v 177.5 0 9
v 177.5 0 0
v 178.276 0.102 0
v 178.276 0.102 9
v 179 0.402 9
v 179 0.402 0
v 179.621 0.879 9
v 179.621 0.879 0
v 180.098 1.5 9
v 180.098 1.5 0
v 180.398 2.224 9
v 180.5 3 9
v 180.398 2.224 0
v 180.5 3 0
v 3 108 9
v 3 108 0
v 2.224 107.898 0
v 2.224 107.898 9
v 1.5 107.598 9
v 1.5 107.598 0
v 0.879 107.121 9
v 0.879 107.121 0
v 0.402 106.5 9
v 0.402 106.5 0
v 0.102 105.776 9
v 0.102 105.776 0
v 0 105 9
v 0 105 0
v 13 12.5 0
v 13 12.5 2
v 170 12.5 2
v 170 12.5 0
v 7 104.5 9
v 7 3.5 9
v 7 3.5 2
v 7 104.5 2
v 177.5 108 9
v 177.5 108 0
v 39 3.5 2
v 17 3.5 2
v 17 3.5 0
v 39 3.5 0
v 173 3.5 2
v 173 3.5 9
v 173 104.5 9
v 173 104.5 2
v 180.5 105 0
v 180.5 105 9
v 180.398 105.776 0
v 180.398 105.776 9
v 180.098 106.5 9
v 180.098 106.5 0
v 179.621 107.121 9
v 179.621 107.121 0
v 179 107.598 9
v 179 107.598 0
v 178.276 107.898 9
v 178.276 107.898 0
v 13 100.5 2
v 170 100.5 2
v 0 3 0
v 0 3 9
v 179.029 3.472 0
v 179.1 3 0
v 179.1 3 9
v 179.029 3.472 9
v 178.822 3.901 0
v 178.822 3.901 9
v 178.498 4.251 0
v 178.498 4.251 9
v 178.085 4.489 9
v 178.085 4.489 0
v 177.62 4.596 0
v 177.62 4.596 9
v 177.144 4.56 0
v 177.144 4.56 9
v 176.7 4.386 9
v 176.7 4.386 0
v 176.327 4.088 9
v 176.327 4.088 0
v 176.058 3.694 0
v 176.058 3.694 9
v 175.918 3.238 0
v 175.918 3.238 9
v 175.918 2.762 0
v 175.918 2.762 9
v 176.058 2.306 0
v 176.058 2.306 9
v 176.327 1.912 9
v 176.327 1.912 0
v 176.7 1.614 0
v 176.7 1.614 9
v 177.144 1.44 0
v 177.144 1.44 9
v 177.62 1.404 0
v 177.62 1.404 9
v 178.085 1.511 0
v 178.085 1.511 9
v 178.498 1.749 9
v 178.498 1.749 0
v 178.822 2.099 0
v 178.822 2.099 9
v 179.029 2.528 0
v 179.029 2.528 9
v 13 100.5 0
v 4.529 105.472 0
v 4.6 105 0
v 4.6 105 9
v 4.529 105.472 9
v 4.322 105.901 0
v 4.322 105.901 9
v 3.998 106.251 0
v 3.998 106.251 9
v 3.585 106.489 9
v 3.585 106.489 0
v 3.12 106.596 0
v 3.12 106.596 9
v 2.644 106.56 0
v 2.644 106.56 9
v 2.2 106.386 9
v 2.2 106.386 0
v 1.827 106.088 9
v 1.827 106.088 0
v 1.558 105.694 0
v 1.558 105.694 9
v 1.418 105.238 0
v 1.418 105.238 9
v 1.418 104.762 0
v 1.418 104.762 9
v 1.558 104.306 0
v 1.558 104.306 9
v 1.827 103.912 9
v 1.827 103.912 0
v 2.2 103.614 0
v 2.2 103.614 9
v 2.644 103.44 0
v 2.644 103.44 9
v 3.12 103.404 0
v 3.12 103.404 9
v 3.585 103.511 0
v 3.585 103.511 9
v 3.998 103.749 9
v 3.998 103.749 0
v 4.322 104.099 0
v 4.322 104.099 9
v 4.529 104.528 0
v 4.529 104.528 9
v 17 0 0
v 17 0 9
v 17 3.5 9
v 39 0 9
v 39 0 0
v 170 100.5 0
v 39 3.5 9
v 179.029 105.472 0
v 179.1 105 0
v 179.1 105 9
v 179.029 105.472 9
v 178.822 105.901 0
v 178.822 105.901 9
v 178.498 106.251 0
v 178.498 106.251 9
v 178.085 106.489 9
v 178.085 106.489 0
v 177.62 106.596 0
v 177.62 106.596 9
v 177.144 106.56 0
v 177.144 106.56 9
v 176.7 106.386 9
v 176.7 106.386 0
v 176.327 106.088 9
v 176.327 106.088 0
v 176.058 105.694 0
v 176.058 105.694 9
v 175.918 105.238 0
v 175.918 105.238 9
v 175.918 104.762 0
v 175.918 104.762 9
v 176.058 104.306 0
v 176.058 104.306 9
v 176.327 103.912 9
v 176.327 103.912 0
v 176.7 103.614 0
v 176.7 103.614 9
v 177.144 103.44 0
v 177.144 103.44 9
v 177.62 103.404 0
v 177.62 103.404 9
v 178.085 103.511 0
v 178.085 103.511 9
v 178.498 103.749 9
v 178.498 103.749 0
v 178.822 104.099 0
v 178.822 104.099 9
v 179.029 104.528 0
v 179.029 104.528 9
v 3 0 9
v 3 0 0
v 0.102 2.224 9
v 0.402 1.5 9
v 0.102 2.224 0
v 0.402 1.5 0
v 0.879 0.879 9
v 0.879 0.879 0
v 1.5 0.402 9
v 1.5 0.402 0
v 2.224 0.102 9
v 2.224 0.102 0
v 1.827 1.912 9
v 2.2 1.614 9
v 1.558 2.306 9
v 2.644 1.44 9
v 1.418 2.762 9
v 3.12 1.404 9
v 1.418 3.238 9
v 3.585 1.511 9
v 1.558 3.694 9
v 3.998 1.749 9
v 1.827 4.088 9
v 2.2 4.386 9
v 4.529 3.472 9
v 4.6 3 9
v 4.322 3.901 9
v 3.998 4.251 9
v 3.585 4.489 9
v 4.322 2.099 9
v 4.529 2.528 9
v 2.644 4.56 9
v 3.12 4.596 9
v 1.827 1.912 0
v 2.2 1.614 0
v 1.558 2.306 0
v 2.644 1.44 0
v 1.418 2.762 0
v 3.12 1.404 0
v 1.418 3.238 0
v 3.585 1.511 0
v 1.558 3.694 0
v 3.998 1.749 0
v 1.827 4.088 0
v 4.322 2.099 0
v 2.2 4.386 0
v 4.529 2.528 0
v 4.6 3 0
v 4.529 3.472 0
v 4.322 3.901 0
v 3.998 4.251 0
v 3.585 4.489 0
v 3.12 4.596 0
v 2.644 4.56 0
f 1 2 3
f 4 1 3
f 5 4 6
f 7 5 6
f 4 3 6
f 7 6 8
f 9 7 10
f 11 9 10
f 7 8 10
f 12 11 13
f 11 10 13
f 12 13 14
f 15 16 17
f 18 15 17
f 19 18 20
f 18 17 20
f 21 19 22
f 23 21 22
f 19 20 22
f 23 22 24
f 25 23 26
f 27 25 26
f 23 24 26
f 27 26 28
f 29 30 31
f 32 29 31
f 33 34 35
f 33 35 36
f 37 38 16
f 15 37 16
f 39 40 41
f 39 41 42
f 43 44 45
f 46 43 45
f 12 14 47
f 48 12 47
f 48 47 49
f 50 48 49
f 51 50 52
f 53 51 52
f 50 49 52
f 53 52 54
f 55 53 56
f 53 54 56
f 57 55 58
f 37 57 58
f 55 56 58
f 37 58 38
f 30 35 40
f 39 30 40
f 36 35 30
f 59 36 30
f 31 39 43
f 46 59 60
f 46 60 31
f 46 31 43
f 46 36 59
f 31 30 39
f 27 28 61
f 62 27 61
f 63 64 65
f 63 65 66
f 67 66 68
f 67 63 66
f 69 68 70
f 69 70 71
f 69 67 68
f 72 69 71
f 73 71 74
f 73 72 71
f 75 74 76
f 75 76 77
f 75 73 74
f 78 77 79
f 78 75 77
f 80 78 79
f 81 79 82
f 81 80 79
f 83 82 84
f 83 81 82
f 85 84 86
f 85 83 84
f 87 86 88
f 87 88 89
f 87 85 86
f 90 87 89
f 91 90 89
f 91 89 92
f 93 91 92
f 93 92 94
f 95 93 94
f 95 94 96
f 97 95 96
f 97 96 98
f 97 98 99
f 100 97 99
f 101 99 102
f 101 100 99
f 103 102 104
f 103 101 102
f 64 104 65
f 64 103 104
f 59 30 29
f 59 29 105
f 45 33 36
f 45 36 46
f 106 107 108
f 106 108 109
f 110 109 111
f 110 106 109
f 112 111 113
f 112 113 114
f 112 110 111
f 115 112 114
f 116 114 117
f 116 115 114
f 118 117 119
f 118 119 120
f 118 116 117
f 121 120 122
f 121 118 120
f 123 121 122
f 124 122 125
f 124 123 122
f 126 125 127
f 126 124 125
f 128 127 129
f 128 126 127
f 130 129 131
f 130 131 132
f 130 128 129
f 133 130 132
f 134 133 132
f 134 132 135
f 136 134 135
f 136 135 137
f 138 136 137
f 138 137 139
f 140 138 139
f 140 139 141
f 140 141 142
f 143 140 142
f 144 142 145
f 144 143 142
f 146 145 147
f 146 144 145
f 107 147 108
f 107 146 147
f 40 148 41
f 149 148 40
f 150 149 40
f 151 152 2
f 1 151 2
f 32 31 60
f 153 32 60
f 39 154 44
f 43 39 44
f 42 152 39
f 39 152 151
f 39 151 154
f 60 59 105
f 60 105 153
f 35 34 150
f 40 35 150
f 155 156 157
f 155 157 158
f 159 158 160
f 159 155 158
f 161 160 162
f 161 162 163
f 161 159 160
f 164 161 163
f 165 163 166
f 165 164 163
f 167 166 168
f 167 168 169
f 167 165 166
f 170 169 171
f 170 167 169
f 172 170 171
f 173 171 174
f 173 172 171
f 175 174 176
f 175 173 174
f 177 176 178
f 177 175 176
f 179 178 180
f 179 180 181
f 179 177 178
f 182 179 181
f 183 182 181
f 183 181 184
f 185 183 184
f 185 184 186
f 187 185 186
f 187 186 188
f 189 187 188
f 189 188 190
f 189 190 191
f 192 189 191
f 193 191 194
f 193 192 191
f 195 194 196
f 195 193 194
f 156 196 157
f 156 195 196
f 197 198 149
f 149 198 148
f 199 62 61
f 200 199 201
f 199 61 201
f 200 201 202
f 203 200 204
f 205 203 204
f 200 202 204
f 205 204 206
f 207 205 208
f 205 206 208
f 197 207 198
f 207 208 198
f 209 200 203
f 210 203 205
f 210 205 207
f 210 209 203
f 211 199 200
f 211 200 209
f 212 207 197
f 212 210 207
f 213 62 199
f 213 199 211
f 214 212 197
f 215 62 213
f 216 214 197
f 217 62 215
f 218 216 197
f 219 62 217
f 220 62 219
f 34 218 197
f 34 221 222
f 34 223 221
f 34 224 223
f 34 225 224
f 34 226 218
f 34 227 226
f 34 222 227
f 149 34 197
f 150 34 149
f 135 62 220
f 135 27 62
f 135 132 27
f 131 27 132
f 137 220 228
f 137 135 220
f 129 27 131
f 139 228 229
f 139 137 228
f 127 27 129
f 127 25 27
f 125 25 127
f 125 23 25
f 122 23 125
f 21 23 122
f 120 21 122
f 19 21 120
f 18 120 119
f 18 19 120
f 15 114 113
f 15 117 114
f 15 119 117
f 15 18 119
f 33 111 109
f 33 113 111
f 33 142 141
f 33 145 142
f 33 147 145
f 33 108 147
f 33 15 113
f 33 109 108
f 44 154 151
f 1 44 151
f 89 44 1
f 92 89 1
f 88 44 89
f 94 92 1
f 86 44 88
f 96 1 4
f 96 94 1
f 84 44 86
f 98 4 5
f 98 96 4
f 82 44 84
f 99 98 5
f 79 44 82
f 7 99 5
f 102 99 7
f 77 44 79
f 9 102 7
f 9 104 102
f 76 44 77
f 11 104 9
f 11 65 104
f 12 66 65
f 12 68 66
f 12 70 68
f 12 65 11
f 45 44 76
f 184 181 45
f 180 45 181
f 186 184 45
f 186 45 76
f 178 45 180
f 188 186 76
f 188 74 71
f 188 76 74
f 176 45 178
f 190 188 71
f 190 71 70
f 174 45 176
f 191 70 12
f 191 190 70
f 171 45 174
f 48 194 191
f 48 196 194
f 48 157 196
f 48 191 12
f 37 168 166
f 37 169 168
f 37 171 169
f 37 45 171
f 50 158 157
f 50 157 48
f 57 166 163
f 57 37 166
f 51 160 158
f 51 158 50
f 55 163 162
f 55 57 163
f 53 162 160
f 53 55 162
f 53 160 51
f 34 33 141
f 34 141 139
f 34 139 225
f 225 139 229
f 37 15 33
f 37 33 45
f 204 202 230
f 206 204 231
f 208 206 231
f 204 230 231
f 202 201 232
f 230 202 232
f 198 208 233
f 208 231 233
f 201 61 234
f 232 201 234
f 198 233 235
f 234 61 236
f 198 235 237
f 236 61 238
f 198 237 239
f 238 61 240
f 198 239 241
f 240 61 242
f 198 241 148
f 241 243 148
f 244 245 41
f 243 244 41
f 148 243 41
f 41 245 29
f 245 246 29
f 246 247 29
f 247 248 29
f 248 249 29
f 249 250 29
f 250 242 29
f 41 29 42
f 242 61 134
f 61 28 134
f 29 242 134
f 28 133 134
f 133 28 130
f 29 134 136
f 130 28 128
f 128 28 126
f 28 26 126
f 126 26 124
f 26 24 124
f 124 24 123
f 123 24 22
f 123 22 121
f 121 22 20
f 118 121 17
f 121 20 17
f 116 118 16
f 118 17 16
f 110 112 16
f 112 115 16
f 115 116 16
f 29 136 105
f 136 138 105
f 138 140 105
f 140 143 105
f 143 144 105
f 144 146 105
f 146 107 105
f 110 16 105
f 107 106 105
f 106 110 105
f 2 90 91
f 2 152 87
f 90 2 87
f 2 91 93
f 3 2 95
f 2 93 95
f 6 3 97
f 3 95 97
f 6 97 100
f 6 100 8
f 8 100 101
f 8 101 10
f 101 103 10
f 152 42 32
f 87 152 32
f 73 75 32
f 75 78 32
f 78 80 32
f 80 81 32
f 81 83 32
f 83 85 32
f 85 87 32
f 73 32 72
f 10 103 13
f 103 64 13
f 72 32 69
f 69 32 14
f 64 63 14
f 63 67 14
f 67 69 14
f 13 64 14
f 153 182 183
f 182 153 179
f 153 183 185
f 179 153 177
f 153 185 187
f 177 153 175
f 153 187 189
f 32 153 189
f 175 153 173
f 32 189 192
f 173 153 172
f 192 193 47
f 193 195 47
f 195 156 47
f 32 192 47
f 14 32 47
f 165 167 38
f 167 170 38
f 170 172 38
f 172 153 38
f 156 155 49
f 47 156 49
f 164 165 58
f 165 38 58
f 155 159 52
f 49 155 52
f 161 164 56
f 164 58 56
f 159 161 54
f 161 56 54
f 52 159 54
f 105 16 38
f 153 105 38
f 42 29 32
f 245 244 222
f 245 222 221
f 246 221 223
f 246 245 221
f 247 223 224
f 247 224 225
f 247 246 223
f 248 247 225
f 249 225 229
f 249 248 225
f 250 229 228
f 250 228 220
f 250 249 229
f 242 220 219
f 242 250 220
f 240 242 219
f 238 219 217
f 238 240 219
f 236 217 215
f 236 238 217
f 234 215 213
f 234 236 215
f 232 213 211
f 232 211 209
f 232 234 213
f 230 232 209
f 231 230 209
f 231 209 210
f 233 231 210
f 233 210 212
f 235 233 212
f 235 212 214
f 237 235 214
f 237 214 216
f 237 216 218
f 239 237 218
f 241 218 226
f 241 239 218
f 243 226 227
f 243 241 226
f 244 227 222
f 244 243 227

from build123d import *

# Parameters (mm, degrees)
SKETCH_1_R          = 1.6
EXTRUDE_3_DEPTH     = 9
SKETCH_3_W          = 166
SKETCH_3_H          = 101
CUT_EXTRUDE_1_DEPTH = 7
SKETCH_5_W          = 157
SKETCH_5_H          = 88
CUT_EXTRUDE_2_DEPTH = 211.459616079
SKETCH_6_W          = 22
SKETCH_6_H          = 3.5
CUT_EXTRUDE_3_DEPTH = 211.535626439


with BuildPart() as part:
    # 草图1 → 凸台-拉伸3 (new body)
    with BuildSketch(Plane.XY):
        with BuildLine():
            Line((3, 0), (177.5, 0))
            ThreePointArc((177.5, 0), (179.621320344, 0.878679656), (180.5, 3))
            Line((180.5, 3), (180.5, 105))
            ThreePointArc((180.5, 105), (179.621320344, 107.121320344), (177.5, 108))
            Line((177.5, 108), (3, 108))
            ThreePointArc((3, 108), (0.878679656, 107.121320344), (0, 105))
            Line((0, 105), (0, 3))
            ThreePointArc((0, 3), (0.878679656, 0.878679656), (3, 0))
        make_face()
        with Locations((3, 3)):
            Circle(SKETCH_1_R, mode=Mode.SUBTRACT)
        with Locations((3, 105)):
            Circle(SKETCH_1_R, mode=Mode.SUBTRACT)
        with Locations((177.5, 105)):
            Circle(SKETCH_1_R, mode=Mode.SUBTRACT)
        with Locations((177.5, 3)):
            Circle(SKETCH_1_R, mode=Mode.SUBTRACT)
    extrude(amount=EXTRUDE_3_DEPTH)

    # 草图3 → 切除-拉伸1 (cut)
    with BuildSketch(Plane.XY.offset(9)):
        with Locations((90, 54)):
            Rectangle(SKETCH_3_W, SKETCH_3_H)
    extrude(amount=-CUT_EXTRUDE_1_DEPTH, mode=Mode.SUBTRACT)

    # 草图5 → 切除-拉伸2 (cut, through all)
    with BuildSketch(Plane.XY.offset(2)):
        with Locations((91.5, 56.5)):
            Rectangle(SKETCH_5_W, SKETCH_5_H)
    extrude(amount=-CUT_EXTRUDE_2_DEPTH, mode=Mode.SUBTRACT)

    # 草图6 → 切除-拉伸3 (cut, through all)
    with BuildSketch(Plane.XY.offset(9)):
        with Locations((28, 1.75)):
            Rectangle(SKETCH_6_W, SKETCH_6_H)
    extrude(amount=-CUT_EXTRUDE_3_DEPTH, mode=Mode.SUBTRACT)


solid = part.part
